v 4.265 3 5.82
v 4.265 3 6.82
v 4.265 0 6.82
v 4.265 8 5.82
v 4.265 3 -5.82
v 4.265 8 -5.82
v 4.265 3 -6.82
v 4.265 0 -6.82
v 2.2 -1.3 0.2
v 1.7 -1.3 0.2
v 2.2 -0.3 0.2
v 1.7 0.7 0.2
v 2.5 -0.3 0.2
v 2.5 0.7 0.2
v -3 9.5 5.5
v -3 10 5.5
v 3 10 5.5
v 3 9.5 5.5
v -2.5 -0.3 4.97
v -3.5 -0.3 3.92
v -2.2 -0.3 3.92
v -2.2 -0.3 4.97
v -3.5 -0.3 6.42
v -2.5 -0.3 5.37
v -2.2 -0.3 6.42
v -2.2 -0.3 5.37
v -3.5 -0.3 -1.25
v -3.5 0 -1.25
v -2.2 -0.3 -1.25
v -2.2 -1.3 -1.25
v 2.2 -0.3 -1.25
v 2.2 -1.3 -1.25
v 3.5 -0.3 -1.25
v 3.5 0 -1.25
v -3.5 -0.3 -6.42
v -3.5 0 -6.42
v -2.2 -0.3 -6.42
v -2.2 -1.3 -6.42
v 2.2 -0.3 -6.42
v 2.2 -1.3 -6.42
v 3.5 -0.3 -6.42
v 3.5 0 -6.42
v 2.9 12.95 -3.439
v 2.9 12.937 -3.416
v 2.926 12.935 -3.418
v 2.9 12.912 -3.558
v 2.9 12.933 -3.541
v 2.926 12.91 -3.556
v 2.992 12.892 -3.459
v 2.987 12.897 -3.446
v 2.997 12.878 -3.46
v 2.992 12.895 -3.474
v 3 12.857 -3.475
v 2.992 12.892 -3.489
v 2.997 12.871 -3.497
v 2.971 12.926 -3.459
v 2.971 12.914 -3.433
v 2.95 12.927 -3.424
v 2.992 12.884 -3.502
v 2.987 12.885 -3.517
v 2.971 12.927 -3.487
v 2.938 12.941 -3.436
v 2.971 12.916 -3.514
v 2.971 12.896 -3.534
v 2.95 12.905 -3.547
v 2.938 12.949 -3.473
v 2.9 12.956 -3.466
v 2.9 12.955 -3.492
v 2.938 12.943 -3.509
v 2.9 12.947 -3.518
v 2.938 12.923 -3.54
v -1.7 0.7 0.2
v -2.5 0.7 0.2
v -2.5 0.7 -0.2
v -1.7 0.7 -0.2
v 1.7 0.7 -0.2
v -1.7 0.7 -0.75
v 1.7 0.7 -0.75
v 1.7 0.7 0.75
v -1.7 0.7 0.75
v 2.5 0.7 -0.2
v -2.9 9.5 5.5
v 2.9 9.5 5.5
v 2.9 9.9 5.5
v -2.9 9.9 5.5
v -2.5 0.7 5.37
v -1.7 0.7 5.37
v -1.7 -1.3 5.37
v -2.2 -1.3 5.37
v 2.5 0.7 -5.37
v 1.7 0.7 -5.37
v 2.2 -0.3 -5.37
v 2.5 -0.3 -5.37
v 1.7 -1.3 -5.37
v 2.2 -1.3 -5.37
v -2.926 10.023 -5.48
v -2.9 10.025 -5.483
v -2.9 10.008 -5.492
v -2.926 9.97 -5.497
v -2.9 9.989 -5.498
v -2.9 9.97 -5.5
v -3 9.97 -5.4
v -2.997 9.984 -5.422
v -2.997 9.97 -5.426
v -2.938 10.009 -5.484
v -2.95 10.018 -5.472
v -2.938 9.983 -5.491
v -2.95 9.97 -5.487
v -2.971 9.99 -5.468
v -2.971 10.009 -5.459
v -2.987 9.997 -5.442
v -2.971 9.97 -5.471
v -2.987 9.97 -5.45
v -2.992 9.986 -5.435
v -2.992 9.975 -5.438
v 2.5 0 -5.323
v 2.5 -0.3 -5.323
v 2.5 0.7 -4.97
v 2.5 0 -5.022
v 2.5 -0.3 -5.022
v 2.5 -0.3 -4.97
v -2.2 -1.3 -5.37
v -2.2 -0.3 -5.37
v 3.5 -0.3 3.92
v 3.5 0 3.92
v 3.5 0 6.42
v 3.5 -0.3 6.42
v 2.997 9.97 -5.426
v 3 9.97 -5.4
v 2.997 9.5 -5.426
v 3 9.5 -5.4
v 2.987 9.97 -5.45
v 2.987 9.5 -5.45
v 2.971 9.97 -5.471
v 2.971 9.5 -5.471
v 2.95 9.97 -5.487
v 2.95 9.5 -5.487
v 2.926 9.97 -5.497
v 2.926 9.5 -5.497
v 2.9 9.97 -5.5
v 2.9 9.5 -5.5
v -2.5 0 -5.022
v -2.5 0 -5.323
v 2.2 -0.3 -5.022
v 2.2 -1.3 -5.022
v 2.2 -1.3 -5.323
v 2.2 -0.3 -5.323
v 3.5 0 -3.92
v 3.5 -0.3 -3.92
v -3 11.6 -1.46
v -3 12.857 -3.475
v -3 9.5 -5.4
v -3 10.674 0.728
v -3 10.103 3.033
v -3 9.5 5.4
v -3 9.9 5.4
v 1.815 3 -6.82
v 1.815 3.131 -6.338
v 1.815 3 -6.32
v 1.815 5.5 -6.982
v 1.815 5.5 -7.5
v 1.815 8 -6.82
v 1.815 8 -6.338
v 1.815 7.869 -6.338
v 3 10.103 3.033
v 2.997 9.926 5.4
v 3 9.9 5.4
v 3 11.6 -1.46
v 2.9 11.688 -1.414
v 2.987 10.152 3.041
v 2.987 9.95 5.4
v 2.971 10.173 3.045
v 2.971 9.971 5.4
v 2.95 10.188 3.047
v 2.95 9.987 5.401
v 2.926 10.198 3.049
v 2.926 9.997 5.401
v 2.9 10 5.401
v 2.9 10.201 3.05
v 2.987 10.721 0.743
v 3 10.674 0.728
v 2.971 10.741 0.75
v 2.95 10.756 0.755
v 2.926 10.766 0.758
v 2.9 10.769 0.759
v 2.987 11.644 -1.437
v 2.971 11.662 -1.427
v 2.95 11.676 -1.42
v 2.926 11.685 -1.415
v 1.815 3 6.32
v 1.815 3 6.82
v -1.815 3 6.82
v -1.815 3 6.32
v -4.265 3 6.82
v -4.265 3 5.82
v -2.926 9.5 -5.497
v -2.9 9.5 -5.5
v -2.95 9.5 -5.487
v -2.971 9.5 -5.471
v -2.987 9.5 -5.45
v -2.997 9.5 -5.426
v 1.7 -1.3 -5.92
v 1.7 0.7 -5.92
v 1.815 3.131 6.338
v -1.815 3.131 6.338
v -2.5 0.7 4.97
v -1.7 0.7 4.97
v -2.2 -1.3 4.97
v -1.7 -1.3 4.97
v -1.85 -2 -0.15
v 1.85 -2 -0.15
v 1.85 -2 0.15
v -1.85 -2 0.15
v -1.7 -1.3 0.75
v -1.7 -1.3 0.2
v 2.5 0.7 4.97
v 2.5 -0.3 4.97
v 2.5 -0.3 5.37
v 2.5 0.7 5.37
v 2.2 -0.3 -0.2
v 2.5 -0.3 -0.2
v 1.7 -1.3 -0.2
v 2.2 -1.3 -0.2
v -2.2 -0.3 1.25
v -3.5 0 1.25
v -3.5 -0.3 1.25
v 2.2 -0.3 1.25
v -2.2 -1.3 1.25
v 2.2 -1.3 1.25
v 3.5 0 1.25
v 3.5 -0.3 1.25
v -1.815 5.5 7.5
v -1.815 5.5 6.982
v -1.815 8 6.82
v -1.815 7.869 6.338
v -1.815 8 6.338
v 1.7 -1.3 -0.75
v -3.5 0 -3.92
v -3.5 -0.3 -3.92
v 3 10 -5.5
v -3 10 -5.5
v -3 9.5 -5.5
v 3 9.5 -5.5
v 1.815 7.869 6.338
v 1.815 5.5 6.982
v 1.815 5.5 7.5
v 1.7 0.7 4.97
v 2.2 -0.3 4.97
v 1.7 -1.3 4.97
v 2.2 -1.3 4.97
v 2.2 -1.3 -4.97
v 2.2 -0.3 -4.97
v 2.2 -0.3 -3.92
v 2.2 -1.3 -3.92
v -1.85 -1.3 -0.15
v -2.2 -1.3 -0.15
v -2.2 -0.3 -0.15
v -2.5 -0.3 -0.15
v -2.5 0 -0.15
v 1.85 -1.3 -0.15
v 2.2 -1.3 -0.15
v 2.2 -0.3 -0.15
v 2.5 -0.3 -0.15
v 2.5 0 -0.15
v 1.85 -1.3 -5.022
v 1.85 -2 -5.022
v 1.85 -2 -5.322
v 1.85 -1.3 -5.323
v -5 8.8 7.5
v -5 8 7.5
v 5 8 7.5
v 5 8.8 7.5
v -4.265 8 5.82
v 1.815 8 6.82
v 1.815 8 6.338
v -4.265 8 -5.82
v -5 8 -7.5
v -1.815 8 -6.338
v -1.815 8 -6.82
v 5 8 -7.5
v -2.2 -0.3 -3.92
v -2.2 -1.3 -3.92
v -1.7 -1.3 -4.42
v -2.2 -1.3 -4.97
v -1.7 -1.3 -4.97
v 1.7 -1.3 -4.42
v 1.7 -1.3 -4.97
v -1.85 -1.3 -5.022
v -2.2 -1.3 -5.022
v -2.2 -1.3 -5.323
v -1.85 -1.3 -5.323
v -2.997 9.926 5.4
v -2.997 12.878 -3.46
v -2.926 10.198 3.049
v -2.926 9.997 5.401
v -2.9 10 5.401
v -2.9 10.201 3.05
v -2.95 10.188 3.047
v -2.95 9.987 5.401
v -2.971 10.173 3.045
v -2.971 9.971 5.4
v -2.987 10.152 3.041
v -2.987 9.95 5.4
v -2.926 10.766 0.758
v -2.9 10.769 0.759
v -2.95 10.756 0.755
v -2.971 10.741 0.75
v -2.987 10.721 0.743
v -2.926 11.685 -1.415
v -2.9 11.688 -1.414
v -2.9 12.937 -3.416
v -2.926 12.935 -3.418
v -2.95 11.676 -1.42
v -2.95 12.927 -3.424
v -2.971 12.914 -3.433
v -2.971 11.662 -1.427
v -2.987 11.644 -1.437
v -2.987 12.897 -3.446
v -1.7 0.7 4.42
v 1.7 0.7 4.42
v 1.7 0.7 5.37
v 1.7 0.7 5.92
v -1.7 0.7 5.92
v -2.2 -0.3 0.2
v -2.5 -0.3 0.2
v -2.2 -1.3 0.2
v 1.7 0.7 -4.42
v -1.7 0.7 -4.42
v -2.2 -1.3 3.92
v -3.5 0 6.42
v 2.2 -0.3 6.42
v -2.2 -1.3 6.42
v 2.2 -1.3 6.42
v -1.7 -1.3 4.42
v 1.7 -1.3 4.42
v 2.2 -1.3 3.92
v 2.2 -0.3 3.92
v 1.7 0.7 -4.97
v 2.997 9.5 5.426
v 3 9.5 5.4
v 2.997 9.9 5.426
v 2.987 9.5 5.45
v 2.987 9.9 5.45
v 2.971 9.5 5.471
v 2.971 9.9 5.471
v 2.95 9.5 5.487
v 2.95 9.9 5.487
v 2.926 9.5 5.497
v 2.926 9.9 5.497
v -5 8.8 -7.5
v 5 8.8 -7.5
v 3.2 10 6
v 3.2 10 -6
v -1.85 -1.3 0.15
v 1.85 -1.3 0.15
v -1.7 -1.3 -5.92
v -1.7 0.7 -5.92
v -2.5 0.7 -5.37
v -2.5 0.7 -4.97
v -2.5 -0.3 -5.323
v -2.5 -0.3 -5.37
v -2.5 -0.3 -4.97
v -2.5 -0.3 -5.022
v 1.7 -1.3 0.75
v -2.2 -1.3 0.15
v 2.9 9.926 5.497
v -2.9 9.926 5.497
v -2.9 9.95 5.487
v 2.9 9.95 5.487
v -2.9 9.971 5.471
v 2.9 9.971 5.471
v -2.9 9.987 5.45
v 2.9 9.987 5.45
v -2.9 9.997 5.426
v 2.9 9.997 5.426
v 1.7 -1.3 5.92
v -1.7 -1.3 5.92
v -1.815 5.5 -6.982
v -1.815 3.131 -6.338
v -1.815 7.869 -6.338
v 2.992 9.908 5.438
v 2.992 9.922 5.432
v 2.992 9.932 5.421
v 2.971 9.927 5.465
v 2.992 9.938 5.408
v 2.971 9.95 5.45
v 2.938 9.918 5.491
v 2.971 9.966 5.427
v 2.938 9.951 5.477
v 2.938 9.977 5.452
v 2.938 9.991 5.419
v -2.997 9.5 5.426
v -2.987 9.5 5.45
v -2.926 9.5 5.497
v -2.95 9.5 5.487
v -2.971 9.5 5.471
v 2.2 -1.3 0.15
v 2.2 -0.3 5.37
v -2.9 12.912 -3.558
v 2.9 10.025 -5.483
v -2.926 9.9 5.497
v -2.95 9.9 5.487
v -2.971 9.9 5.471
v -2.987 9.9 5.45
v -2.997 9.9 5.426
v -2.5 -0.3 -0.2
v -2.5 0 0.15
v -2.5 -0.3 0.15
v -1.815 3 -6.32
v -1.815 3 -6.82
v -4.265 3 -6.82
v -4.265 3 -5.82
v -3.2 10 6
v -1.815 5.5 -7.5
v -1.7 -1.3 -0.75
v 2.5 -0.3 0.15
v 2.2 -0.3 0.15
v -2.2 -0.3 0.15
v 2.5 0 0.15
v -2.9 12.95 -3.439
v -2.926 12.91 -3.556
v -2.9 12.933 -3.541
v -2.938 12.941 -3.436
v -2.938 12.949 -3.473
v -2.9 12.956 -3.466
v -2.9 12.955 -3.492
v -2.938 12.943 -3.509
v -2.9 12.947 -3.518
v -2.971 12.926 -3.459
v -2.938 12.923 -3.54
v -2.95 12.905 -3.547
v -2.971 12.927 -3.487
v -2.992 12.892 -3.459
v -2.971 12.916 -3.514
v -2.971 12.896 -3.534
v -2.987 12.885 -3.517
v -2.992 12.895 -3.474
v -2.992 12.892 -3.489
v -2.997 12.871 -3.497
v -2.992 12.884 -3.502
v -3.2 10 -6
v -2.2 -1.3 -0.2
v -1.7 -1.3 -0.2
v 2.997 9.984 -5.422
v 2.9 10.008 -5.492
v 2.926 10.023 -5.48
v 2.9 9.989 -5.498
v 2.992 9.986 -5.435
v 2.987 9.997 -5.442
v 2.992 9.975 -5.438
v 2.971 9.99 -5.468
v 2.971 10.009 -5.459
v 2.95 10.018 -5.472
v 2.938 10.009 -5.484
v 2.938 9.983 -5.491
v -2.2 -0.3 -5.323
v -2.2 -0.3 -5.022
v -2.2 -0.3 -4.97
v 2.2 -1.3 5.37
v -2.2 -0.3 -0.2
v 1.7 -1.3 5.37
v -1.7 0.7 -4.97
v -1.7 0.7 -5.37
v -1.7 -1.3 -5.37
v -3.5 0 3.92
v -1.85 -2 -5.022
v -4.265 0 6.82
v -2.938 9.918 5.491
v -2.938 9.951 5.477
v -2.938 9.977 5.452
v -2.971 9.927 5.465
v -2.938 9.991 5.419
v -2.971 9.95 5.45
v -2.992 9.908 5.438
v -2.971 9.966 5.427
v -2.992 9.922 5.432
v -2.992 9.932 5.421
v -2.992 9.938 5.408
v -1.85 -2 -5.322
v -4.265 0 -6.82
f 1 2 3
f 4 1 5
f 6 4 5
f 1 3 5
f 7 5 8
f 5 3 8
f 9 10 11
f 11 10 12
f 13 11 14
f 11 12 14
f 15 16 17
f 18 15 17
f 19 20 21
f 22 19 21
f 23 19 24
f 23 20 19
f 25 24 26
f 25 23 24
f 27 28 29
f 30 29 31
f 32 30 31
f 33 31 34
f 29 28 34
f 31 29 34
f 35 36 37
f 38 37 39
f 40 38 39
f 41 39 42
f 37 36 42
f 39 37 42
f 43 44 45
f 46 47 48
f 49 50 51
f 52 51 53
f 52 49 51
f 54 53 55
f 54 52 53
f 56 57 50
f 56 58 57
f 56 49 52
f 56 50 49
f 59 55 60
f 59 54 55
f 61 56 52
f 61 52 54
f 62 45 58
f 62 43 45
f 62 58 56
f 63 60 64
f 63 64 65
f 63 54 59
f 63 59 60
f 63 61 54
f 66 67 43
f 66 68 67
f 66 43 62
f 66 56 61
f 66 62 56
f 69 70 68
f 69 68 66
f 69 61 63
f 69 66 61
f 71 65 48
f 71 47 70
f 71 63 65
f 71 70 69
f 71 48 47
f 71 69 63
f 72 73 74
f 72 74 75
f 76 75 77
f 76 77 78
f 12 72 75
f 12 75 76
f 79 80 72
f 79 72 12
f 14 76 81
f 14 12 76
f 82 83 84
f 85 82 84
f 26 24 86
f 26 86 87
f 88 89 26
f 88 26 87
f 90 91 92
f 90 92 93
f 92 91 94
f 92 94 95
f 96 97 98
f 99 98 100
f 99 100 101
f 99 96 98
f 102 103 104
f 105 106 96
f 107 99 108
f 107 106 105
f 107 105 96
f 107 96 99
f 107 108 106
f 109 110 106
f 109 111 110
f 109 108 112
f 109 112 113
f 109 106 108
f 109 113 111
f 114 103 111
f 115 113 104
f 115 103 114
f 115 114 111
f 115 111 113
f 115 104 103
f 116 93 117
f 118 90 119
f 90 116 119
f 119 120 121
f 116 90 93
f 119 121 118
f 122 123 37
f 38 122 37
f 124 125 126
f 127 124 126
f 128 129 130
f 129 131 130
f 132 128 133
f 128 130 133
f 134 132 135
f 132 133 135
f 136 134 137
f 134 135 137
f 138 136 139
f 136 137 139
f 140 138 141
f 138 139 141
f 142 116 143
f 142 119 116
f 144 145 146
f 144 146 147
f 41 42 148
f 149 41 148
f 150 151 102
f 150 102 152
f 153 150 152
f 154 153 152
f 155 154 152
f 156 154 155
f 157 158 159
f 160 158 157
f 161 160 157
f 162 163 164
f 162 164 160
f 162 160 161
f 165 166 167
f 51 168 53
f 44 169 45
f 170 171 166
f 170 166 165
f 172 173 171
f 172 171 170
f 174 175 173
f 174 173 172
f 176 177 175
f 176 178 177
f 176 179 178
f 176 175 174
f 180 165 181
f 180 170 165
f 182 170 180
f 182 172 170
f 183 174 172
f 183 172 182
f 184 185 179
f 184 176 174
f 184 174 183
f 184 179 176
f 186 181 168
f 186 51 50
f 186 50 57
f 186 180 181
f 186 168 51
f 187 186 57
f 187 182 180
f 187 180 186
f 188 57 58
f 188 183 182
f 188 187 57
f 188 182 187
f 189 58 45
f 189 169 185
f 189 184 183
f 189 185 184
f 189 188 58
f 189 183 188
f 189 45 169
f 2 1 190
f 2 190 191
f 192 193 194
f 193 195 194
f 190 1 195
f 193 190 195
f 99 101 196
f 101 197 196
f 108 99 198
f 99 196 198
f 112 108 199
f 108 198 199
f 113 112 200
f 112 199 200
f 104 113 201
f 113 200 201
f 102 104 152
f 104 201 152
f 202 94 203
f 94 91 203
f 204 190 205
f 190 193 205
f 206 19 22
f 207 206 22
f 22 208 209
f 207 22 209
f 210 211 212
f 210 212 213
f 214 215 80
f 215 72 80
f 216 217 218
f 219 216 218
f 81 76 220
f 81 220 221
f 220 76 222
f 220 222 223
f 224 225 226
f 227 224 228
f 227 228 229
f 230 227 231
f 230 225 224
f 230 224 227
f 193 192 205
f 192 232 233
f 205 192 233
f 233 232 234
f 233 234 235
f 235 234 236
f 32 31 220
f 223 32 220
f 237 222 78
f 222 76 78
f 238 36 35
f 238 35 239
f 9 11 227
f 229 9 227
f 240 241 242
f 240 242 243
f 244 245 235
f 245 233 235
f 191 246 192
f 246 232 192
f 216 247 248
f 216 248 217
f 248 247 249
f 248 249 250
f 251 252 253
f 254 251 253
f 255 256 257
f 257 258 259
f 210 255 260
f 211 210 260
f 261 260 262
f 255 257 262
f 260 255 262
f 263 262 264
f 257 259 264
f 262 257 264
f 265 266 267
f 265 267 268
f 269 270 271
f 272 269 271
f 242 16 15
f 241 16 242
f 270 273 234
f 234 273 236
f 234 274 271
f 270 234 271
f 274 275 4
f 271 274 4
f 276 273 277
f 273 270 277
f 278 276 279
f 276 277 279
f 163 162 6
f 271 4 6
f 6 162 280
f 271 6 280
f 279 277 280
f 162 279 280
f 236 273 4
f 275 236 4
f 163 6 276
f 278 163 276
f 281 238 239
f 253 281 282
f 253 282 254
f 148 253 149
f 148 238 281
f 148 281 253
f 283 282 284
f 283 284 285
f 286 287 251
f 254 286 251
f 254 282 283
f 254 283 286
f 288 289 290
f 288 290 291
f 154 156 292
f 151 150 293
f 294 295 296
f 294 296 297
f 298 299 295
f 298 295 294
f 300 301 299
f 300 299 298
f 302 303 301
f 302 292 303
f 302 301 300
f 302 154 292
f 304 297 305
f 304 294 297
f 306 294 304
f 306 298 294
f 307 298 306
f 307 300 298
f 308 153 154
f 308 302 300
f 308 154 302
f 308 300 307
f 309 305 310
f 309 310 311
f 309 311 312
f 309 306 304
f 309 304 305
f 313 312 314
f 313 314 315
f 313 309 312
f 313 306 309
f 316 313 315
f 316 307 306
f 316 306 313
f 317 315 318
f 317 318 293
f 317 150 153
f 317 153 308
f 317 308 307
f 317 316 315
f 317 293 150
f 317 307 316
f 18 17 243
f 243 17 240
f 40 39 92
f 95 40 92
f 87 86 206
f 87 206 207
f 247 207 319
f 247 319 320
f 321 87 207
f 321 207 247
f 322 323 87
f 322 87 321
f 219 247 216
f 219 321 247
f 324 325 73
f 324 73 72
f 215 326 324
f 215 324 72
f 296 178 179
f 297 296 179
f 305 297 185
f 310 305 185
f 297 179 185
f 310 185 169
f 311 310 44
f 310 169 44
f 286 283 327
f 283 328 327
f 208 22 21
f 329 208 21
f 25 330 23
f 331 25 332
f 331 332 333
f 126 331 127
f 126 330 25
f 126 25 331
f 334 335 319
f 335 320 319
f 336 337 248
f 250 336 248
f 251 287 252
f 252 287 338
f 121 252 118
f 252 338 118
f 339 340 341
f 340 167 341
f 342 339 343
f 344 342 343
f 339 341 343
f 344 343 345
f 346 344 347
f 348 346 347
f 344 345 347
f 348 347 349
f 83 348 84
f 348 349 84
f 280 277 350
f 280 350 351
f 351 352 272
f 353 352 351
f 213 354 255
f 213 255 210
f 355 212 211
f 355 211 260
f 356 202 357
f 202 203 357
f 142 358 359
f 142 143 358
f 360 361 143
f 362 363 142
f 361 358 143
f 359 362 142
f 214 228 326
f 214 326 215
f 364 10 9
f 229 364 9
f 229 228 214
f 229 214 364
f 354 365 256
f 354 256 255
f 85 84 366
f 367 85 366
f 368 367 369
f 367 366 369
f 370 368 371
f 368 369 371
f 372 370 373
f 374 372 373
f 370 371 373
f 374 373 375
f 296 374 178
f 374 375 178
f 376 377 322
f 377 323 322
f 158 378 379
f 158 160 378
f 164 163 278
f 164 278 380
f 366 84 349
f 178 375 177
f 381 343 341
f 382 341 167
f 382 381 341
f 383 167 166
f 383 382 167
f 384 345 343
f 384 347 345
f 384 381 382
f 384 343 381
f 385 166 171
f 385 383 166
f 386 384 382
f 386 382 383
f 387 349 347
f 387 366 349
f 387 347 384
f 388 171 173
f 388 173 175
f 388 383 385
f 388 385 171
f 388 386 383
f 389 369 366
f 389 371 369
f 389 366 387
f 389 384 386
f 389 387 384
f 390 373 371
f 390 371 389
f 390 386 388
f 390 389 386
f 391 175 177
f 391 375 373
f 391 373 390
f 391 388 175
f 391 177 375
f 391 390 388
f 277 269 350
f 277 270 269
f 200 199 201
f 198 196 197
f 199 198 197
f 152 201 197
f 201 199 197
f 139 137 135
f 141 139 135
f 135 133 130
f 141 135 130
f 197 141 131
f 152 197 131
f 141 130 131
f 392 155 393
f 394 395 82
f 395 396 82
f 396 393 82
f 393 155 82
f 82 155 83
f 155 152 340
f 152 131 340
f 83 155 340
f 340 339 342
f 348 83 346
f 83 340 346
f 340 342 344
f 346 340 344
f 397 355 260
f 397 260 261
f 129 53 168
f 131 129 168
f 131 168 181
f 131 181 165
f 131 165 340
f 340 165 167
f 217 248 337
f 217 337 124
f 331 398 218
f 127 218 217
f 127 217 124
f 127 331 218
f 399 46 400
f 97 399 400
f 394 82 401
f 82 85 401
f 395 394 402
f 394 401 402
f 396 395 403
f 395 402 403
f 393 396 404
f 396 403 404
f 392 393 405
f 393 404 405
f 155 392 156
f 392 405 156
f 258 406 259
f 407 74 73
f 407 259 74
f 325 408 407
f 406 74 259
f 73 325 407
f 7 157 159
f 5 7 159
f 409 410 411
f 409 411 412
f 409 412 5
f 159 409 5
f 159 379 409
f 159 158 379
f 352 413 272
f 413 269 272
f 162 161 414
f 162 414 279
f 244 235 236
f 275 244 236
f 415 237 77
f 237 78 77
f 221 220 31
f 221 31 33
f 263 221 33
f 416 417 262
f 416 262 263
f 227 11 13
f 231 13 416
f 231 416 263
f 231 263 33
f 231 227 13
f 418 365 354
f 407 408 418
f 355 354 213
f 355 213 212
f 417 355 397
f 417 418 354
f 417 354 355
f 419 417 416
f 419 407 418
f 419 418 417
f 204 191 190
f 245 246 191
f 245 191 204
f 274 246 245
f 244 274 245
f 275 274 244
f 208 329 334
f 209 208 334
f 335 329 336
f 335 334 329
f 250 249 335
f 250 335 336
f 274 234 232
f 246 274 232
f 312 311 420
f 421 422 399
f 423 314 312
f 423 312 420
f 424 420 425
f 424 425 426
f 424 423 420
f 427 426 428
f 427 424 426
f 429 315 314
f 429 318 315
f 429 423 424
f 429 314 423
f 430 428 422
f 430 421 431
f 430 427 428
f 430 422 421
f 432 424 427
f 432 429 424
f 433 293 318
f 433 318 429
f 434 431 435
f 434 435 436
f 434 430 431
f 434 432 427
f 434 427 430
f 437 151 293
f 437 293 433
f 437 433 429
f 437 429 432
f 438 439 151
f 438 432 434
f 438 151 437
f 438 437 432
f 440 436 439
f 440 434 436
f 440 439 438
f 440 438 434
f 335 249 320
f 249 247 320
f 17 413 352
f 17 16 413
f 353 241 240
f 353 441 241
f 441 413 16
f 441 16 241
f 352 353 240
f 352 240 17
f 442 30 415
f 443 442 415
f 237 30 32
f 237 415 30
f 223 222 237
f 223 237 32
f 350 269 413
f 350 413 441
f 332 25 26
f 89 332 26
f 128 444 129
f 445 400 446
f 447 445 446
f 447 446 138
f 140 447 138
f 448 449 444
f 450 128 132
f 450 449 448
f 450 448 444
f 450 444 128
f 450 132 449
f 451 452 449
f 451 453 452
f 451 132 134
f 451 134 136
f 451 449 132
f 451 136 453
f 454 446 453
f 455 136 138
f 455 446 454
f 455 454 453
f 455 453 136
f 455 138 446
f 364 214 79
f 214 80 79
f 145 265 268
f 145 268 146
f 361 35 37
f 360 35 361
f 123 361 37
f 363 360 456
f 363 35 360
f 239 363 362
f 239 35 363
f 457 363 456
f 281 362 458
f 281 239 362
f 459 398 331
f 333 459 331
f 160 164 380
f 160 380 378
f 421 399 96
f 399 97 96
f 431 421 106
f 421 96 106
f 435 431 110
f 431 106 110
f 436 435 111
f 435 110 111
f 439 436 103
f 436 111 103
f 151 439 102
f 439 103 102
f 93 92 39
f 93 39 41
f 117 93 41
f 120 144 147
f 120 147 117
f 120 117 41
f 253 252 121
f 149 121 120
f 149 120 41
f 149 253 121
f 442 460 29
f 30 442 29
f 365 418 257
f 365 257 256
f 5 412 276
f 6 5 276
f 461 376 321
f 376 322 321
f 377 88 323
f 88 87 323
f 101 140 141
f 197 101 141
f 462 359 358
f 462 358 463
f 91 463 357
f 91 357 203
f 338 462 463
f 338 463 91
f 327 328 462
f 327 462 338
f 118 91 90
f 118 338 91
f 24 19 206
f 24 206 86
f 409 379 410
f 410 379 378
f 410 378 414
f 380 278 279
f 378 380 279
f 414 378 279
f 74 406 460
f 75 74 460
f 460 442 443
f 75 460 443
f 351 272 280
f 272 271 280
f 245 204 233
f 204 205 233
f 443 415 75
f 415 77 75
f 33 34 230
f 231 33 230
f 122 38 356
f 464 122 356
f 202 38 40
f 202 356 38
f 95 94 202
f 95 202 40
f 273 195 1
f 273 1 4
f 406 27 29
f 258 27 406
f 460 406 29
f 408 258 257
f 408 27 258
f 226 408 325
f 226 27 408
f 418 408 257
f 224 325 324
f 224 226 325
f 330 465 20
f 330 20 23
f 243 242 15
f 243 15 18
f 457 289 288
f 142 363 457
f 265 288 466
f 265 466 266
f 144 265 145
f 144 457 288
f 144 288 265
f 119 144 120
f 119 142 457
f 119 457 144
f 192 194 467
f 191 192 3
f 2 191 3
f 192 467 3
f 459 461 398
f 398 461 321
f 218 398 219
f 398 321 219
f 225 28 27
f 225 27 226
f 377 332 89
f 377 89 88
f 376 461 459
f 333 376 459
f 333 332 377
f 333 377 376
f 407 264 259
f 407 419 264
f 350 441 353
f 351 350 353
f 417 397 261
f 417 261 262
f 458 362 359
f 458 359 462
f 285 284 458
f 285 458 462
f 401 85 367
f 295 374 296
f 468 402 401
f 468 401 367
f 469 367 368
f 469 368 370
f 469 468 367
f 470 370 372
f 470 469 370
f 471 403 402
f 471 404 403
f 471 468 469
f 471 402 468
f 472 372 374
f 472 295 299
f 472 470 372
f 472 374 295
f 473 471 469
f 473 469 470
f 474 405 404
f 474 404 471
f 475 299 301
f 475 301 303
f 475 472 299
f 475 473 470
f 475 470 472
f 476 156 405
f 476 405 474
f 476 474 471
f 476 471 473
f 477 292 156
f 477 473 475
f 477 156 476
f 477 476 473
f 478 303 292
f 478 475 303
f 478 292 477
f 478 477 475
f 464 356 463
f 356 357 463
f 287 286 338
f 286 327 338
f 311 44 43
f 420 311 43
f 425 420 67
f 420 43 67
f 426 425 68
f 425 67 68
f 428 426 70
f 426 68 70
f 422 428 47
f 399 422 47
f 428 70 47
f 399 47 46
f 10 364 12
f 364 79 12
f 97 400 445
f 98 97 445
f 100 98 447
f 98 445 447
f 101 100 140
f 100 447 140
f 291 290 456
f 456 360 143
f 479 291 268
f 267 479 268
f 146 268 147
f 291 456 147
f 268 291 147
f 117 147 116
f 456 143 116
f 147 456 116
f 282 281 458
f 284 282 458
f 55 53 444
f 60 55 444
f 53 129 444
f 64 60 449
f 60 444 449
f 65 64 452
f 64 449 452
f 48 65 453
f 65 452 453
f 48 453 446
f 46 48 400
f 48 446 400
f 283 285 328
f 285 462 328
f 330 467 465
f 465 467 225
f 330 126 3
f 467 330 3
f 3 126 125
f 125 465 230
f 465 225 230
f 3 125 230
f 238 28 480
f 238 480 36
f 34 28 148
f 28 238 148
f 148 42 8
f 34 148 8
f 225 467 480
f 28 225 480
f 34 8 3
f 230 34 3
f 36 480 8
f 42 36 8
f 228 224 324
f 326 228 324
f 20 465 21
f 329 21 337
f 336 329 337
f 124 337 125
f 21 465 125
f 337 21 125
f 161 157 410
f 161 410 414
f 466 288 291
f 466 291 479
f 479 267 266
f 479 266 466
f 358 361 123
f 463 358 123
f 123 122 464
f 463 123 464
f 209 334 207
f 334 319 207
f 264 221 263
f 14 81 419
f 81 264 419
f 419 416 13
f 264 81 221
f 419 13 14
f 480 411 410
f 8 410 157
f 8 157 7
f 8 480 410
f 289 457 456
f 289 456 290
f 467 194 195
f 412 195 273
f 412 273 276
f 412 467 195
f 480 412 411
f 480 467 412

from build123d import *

# Parameters (mm, degrees)
SKETCH1_W           = 8.53
SKETCH1_H           = 13.64
BOSS_EXTRUDE1_DEPTH = 10
SKETCH2_W           = 1
SKETCH2_H           = 5
CUT_EXTRUDE1_DEPTH  = 15.807879659
SKETCH3_W           = 6
SKETCH3_H           = 11
CUT_EXTRUDE2_DEPTH  = 0.5
BOSS_EXTRUDE2_START = -2
SKETCH4_W           = 10
SKETCH4_H           = 15
SKETCH4_W_2         = 8.53
SKETCH4_H_2         = 13.64
SKETCH4_W_3         = 6
SKETCH4_H_3         = 11
BOSS_EXTRUDE2_DEPTH = 2
CHAMFER1_SIZE       = 1.5
CHAMFER1_SIZE2      = 1.2
CHAMFER2_SIZE       = 1.2
CHAMFER2_SIZE2      = 1.5
CHAMFER3_SIZE       = 1.8
CHAMFER3_SIZE2      = 1.2
CHAMFER4_SIZE       = 1.2
CHAMFER4_SIZE2      = 1.8
BOSS_EXTRUDE3_DEPTH = 1.815
SKETCH7_W           = 7
SKETCH7_H           = 2.5
BOSS_EXTRUDE4_DEPTH = 0.3
BOSS_EXTRUDE5_DEPTH = 1
SKETCH8_5_W         = 5
SKETCH8_5_H         = 0.4
SKETCH8_5_W_2       = 3.4
SKETCH8_5_H_2       = 1.5
CUT_EXTRUDE4_DEPTH  = 1
BOSS_EXTRUDE6_DEPTH = 0.15
LPATTERN1_COUNT     = 2
LPATTERN1_PITCH     = 5.1725
BOSS_EXTRUDE7_DEPTH = 3
FILLET1_R           = 0.1
SKETCH12_W          = 12.226459424
SKETCH12_H          = 6.113229712
CUT_EXTRUDE5_DEPTH  = 19.902309573


with BuildPart() as part:
    # Sketch1 → Boss-Extrude1 (new body)
    with BuildSketch(Plane(origin=(0, 0, 0), x_dir=(1, 0, 0), z_dir=(0, 1, 0))):
        Rectangle(SKETCH1_W, SKETCH1_H)
    extrude(amount=BOSS_EXTRUDE1_DEPTH)

    # Sketch2 → Cut-Extrude1 (cut, through all)
    with BuildSketch(Plane.ZY.offset(4.265)):
        with Locations((-6.32, 5.5)):
            Rectangle(SKETCH2_W, SKETCH2_H)
        with Locations((6.32, 5.5)):
            Rectangle(SKETCH2_W, SKETCH2_H)
    extrude(amount=-CUT_EXTRUDE1_DEPTH, mode=Mode.SUBTRACT)

    # Sketch3 → Cut-Extrude2 (cut)
    with BuildSketch(Plane(origin=(0, 10, 0), x_dir=(1, 0, 0), z_dir=(0, 1, 0))):
        Rectangle(SKETCH3_W, SKETCH3_H)
    extrude(amount=-CUT_EXTRUDE2_DEPTH, mode=Mode.SUBTRACT)

    # Sketch4 → Boss-Extrude2 (add)
    # profile 1 of 2: a face of its own
    with BuildSketch(Plane(origin=(0, 10, 0), x_dir=(1, 0, 0), z_dir=(0, 1, 0)).offset(BOSS_EXTRUDE2_START)):
        Rectangle(SKETCH4_W, SKETCH4_H)
        Rectangle(SKETCH4_W_2, SKETCH4_H_2, mode=Mode.SUBTRACT)
    # profile 2 of 2: a face of its own
    with BuildSketch(Plane(origin=(0, 10, 0), x_dir=(1, 0, 0), z_dir=(0, 1, 0)).offset(BOSS_EXTRUDE2_START)):
        Rectangle(SKETCH4_W_2, SKETCH4_H_2)
        Rectangle(SKETCH4_W_3, SKETCH4_H_3, mode=Mode.SUBTRACT)
    extrude(amount=BOSS_EXTRUDE2_DEPTH)

    # Chamfer1
    chamfer1_edges = [part.edges().sort_by_distance(p)[0] for p in [
        (0, 10, 7.5),
    ]]
    chamfer1_side = [part.faces().sort_by_distance(p)[0] for p in [
        (-4.819722436, 10, 0),
    ]]
    chamfer(chamfer1_edges, length=CHAMFER1_SIZE, length2=CHAMFER1_SIZE2, reference=chamfer1_side[0])

    # Chamfer2
    chamfer2_edges = [part.edges().sort_by_distance(p)[0] for p in [
        (0, 10, -7.5),
    ]]
    chamfer2_side = [part.faces().sort_by_distance(p)[0] for p in [
        (0, 9, -7.5),
    ]]
    chamfer(chamfer2_edges, length=CHAMFER2_SIZE, length2=CHAMFER2_SIZE2, reference=chamfer2_side[0])

    # Chamfer3
    chamfer3_edges = [part.edges().sort_by_distance(p)[0] for p in [
        (-5, 10, 0),
    ]]
    chamfer3_side = [part.faces().sort_by_distance(p)[0] for p in [
        (-4.843795006, 10, 0),
    ]]
    chamfer(chamfer3_edges, length=CHAMFER3_SIZE, length2=CHAMFER3_SIZE2, reference=chamfer3_side[0])

    # Chamfer4
    chamfer4_edges = [part.edges().sort_by_distance(p)[0] for p in [
        (5, 10, 0),
    ]]
    chamfer4_side = [part.faces().sort_by_distance(p)[0] for p in [
        (5, 8.961702128, 0),
    ]]
    chamfer(chamfer4_edges, length=CHAMFER4_SIZE, length2=CHAMFER4_SIZE2, reference=chamfer4_side[0])

    # Sketch6 → Boss-Extrude3 (add, symmetric)
    with BuildSketch(Plane(origin=(0, 0, 0), x_dir=(0, 0, -1), z_dir=(1, 0, 0))):
        Polygon((-6.82, 8), (-7.5, 5.5), (-6.82, 3), (-6.32, 3), (-6.337529128, 3.131232077), (-6.981834003, 5.5), (-6.337529128, 7.868767923), (-6.337529128, 8), align=None)
        Polygon((6.32, 3), (6.82, 3), (7.5, 5.5), (6.82, 8), (6.337529128, 8), (6.337529128, 7.868767923), (6.981834003, 5.5), (6.337529128, 3.131232077), align=None)
    extrude(amount=BOSS_EXTRUDE3_DEPTH, both=True)

    # Sketch7 → Boss-Extrude4 (add)
    with BuildSketch(Plane.XZ):
        Rectangle(SKETCH7_W, SKETCH7_H)
        with Locations((0, -5.17)):
            Rectangle(SKETCH7_W, SKETCH7_H)
        with Locations((0, 5.17)):
            Rectangle(SKETCH7_W, SKETCH7_H)
    extrude(amount=BOSS_EXTRUDE4_DEPTH)

    # Sketch8 → Boss-Extrude5 (add)
    with BuildSketch(Plane.XZ.offset(0.3)):
        Polygon((1.7, 5.37), (2.2, 5.37), (2.2, 6.42), (-2.2, 6.42), (-2.2, 5.37), (-1.7, 5.37), (-1.7, 5.92), (1.7, 5.92), align=None)
        Polygon((-2.2, 3.92), (2.2, 3.92), (2.2, 4.97), (1.7, 4.97), (1.7, 4.42), (-1.7, 4.42), (-1.7, 4.97), (-2.2, 4.97), align=None)
        Polygon((1.7, 0.2), (2.2, 0.2), (2.2, 1.25), (-2.2, 1.25), (-2.2, 0.2), (-1.7, 0.2), (-1.7, 0.75), (1.7, 0.75), align=None)
        Polygon((-2.2, -1.25), (2.2, -1.25), (2.2, -0.2), (1.7, -0.2), (1.7, -0.75), (-1.7, -0.75), (-1.7, -0.2), (-2.2, -0.2), align=None)
        Polygon((1.7, -4.97), (2.2, -4.97), (2.2, -3.92), (-2.2, -3.92), (-2.2, -4.97), (-1.7, -4.97), (-1.7, -4.42), (1.7, -4.42), align=None)
        Polygon((-2.2, -6.42), (2.2, -6.42), (2.2, -5.37), (1.7, -5.37), (1.7, -5.92), (-1.7, -5.92), (-1.7, -5.37), (-2.2, -5.37), align=None)
    extrude(amount=BOSS_EXTRUDE5_DEPTH)

    # Sketch8<5> → Cut-Extrude4 (cut)
    with BuildSketch(Plane.XZ.offset(0.3)):
        Rectangle(SKETCH8_5_W, SKETCH8_5_H)
        with Locations((0, -5.17)):
            Rectangle(SKETCH8_5_W, SKETCH8_5_H)
        with Locations((0, 5.17)):
            Rectangle(SKETCH8_5_W, SKETCH8_5_H)
        with Locations((0, 5.17)):
            Rectangle(SKETCH8_5_W_2, SKETCH8_5_H_2)
        Rectangle(SKETCH8_5_W_2, SKETCH8_5_H_2)
        with Locations((0, -5.17)):
            Rectangle(SKETCH8_5_W_2, SKETCH8_5_H_2)
    extrude(amount=-CUT_EXTRUDE4_DEPTH, mode=Mode.SUBTRACT)

    # Sketch10 → Boss-Extrude6 (add, symmetric)
    # profile 1 of 2: a face of its own
    with BuildSketch(Plane.XY):
        Polygon((1.85, -1.65), (1.85, -1.3), (-1.85, -1.3), (-1.85, -1.65), (-1.85, -6.5), (-1.35, -7), (1.35, -7), (1.85, -6.5), align=None)
        with BuildLine():
            ThreePointArc((0.5, -5.5), (0, -6), (-0.5, -5.5))
            Line((-0.5, -5.5), (-0.5, -3.7))
            ThreePointArc((-0.5, -3.7), (0, -3.2), (0.5, -3.7))
            Line((0.5, -3.7), (0.5, -5.5))
        make_face(mode=Mode.SUBTRACT)
    # profile 2 of 2: a face of its own
    with BuildSketch(Plane.XY):
        Polygon((2.5, 0), (1.85, 0), (-1.85, 0), (-2.5, 0), (-2.5, -0.3), (-2.2, -0.3), (-2.2, -1.3), (-1.85, -1.3), (1.85, -1.3), (2.2, -1.3), (2.2, -0.3), (2.5, -0.3), align=None)
    boss_extrude6 = extrude(amount=BOSS_EXTRUDE6_DEPTH, both=True)

    # LPattern1: Boss-Extrude6 ×2
    with Locations(*[(0, 0, -i * LPATTERN1_PITCH) for i in range(1, LPATTERN1_COUNT)]):
        add(boss_extrude6)

    # Sketch12 → Cut-Extrude5 (cut, through all)
    with BuildSketch(Plane(origin=(0, 0, -5.3225), x_dir=(-1, 0, 0), z_dir=(0, 0, -1))):
        with Locations((0.605815557, -5.056614856)):
            Rectangle(SKETCH12_W, SKETCH12_H)
    extrude(amount=-CUT_EXTRUDE5_DEPTH, mode=Mode.SUBTRACT)


with BuildPart() as body_2:
    # Sketch11 → Boss-Extrude7 (new, symmetric)
    with BuildSketch(Plane(origin=(0, 0, 0), x_dir=(0, 0, -1), z_dir=(1, 0, 0))):
        with BuildLine():
            Line((5.5, 9.5), (-5.5, 9.5))
            Line((-5.5, 9.5), (-5.5, 9.900331129))
            ThreePointArc((-5.5, 9.900331129), (-5.470944433, 9.970807277), (-5.400662252, 10.000328937))
            ThreePointArc((-5.400662252, 10.000328937), (-0.759264413, 10.768857175), (3.415788118, 12.937300375))
            ThreePointArc((3.415788118, 12.937300375), (3.492454919, 12.955387143), (3.558431735, 12.912352398))
            Line((3.558431735, 12.912352398), (5.483205029, 10.025192456))
            ThreePointArc((5.483205029, 10.025192456), (5.495709203, 9.998700851), (5.5, 9.969722436))
            Line((5.5, 9.969722436), (5.5, 9.5))
        make_face()
    extrude(amount=BOSS_EXTRUDE7_DEPTH, both=True)

    # Fillet1
    fillet1_edges = [body_2.edges().sort_by_distance(p)[0] for p in [
        (-3, 12.955387143, -3.492454919),
        (-3, 11.468772427, -4.520818382),
        (-3, 9.998700851, -5.495709203),
        (-3, 9.734861218, -5.5),
        (3, 11.468772427, -4.520818382),
        (3, 12.955387143, -3.492454919),
        (3, 10.768857175, 0.759264413),
        (3, 9.970807277, 5.470944433),
        (3, 9.700165565, 5.5),
        (3, 9.734861218, -5.5),
        (3, 9.998700851, -5.495709203),
        (-3, 9.700165565, 5.5),
        (-3, 9.970807277, 5.470944433),
        (-3, 10.768857175, 0.759264413),
    ]]
    fillet(fillet1_edges, radius=FILLET1_R)


solid = Compound([part.part, body_2.part])
